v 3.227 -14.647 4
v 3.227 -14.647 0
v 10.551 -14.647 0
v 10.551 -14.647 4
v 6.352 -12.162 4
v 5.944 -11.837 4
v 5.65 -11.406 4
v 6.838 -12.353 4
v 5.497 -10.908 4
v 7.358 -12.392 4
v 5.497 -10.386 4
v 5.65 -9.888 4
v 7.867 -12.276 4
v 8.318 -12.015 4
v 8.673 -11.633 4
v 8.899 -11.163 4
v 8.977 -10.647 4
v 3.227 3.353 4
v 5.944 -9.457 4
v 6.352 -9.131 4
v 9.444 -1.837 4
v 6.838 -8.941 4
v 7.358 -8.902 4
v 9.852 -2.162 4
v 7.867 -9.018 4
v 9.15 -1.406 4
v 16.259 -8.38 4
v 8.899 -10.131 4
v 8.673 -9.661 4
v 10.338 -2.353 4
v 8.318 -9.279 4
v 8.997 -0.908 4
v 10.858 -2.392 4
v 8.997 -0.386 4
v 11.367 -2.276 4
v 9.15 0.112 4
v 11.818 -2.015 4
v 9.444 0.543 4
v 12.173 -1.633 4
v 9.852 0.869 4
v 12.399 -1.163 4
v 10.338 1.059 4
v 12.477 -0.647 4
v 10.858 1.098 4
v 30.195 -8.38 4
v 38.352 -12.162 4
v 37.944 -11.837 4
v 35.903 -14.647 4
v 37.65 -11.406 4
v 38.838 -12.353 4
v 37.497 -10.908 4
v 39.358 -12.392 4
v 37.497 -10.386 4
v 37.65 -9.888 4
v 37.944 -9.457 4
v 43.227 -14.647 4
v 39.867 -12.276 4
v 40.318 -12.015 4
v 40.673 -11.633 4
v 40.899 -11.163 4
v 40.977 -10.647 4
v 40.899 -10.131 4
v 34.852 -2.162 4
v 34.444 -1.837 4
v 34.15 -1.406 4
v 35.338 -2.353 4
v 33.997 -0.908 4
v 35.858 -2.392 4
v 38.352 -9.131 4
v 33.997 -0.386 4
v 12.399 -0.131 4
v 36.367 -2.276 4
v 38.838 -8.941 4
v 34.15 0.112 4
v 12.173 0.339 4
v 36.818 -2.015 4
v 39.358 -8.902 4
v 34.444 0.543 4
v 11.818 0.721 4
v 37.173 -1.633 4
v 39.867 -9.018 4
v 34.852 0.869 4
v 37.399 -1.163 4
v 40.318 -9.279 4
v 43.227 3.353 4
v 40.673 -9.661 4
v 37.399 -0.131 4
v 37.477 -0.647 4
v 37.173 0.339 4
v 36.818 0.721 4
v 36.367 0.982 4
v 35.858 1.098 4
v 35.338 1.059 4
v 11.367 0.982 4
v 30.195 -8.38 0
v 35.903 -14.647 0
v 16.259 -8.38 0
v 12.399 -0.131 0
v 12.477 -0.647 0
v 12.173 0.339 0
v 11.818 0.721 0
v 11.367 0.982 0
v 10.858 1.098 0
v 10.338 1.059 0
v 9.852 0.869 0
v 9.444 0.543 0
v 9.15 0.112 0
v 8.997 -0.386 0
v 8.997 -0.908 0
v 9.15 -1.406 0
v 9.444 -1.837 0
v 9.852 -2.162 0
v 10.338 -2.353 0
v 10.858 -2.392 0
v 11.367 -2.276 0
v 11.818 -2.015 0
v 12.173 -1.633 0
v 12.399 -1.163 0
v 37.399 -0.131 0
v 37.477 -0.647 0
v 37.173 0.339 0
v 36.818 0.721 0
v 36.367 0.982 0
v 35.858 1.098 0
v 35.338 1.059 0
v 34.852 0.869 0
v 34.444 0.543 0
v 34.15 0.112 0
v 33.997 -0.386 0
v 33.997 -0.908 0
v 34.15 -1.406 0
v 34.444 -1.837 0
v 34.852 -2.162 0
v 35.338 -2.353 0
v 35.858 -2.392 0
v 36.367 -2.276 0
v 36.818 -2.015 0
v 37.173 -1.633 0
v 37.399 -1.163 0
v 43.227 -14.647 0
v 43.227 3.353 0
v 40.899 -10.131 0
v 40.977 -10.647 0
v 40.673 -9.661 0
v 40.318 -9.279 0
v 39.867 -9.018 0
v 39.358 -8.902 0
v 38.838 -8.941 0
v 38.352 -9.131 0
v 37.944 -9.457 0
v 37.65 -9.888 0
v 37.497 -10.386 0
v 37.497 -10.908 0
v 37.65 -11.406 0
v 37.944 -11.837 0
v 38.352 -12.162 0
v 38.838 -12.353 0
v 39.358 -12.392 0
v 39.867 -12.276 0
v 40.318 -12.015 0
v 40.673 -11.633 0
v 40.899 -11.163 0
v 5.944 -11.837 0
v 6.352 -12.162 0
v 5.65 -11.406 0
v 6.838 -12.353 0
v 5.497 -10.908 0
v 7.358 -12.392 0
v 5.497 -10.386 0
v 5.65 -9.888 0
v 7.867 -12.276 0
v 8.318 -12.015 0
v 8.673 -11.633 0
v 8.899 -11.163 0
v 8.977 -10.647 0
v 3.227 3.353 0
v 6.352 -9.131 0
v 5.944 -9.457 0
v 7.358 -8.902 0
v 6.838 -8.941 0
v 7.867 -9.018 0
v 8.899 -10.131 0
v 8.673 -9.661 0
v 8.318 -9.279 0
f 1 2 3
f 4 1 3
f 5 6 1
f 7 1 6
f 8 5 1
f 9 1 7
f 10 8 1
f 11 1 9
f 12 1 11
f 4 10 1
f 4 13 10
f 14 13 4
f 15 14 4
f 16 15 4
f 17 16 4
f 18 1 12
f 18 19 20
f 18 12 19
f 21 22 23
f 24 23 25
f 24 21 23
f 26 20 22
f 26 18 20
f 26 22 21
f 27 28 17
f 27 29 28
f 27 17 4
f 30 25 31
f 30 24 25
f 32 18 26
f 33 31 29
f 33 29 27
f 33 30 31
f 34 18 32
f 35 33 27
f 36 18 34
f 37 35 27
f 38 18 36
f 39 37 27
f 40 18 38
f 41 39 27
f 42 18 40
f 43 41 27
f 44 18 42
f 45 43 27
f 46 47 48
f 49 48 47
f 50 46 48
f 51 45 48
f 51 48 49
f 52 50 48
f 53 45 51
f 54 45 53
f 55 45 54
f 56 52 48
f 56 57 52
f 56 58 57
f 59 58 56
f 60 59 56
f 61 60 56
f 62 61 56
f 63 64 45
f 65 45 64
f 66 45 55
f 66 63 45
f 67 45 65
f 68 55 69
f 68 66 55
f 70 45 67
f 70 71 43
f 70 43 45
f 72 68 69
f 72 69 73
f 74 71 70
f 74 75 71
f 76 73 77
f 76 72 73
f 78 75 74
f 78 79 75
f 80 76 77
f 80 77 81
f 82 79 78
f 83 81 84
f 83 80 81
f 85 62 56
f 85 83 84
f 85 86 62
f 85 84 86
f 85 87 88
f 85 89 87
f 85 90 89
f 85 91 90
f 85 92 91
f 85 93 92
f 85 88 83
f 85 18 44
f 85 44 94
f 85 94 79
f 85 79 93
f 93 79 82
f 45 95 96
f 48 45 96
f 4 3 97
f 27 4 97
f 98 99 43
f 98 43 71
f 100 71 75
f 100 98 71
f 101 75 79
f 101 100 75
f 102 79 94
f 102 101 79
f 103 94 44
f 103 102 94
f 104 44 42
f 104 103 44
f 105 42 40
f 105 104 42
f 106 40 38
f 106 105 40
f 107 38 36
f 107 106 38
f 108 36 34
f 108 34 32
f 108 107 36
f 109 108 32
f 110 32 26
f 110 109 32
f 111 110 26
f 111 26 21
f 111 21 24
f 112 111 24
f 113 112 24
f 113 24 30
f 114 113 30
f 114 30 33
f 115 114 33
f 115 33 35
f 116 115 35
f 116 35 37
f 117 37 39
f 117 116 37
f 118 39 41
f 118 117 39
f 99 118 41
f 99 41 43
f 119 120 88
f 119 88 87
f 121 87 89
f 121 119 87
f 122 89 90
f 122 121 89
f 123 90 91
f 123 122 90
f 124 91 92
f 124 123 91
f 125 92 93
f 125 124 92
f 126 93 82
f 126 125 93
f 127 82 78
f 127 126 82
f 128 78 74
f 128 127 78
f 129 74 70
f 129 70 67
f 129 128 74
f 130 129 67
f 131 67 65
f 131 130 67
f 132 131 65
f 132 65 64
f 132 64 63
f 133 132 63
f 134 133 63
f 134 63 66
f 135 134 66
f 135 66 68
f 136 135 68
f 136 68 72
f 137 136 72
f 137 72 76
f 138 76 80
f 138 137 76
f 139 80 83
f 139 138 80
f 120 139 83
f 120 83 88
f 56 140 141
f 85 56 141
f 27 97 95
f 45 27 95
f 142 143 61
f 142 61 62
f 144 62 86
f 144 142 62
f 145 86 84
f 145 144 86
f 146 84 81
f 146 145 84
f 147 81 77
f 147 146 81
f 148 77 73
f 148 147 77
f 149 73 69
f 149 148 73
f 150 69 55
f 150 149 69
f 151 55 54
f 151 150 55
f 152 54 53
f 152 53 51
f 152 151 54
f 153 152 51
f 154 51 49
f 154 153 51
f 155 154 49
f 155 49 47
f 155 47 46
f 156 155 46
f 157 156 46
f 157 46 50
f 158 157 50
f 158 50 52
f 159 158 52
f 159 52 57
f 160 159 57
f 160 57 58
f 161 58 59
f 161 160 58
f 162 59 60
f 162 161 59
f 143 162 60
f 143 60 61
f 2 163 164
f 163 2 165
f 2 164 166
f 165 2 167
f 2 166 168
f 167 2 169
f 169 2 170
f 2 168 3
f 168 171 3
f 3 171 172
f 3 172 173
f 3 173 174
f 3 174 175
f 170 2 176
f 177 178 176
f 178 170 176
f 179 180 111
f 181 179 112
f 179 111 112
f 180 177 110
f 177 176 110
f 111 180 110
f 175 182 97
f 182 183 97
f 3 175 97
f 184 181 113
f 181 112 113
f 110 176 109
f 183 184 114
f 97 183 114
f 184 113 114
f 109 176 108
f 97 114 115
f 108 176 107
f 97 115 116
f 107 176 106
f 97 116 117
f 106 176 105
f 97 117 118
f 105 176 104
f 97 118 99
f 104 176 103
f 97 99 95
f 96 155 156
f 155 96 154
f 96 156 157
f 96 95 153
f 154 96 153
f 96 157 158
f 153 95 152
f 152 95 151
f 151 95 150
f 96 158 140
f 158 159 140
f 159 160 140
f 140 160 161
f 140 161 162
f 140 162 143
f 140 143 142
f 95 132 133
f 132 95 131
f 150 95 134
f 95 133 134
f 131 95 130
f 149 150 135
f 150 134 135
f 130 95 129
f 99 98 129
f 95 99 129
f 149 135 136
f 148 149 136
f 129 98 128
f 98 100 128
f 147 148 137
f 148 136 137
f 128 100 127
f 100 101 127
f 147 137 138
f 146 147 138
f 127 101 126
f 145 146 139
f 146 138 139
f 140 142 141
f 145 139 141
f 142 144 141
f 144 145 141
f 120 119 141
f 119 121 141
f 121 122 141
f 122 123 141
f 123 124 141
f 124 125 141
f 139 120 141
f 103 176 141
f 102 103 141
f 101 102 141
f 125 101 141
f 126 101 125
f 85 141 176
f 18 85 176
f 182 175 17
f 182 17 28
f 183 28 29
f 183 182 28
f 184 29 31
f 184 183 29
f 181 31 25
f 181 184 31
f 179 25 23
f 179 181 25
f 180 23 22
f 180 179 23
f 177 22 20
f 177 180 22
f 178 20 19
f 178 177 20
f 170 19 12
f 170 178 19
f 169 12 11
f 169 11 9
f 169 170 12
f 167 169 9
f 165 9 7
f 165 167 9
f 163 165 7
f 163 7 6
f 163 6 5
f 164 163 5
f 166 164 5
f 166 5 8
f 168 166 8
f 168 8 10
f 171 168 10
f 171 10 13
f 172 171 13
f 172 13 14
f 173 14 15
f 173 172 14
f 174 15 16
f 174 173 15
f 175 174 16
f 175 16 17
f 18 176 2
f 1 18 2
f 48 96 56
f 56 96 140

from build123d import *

# Parameters (mm, degrees)
F0_R     = 1.75
F1_DEPTH = 4


with BuildPart() as f1:
    # F0 (on Top) → F1 (new body)
    with BuildSketch(Plane.XY):
        Polygon((23.22716, 3.353091), (3.22716, 3.353091), (3.22716, -14.646909), (10.551348, -14.646909), (16.259164, -8.379568), (23.22716, -8.379568), align=None)
        with Locations((7.22716, -10.646909)):
            Circle(F0_R, mode=Mode.SUBTRACT)
        with Locations((10.72716, -0.646909)):
            Circle(F0_R, mode=Mode.SUBTRACT)
        Polygon((43.22716, 3.353091), (23.22716, 3.353091), (23.22716, -8.379568), (30.195156, -8.379568), (35.902971, -14.646909), (43.22716, -14.646909), align=None)
        with Locations((39.22716, -10.646909)):
            Circle(F0_R, mode=Mode.SUBTRACT)
        with Locations((35.72716, -0.646909)):
            Circle(F0_R, mode=Mode.SUBTRACT)
    extrude(amount=F1_DEPTH)


solid = f1.part
